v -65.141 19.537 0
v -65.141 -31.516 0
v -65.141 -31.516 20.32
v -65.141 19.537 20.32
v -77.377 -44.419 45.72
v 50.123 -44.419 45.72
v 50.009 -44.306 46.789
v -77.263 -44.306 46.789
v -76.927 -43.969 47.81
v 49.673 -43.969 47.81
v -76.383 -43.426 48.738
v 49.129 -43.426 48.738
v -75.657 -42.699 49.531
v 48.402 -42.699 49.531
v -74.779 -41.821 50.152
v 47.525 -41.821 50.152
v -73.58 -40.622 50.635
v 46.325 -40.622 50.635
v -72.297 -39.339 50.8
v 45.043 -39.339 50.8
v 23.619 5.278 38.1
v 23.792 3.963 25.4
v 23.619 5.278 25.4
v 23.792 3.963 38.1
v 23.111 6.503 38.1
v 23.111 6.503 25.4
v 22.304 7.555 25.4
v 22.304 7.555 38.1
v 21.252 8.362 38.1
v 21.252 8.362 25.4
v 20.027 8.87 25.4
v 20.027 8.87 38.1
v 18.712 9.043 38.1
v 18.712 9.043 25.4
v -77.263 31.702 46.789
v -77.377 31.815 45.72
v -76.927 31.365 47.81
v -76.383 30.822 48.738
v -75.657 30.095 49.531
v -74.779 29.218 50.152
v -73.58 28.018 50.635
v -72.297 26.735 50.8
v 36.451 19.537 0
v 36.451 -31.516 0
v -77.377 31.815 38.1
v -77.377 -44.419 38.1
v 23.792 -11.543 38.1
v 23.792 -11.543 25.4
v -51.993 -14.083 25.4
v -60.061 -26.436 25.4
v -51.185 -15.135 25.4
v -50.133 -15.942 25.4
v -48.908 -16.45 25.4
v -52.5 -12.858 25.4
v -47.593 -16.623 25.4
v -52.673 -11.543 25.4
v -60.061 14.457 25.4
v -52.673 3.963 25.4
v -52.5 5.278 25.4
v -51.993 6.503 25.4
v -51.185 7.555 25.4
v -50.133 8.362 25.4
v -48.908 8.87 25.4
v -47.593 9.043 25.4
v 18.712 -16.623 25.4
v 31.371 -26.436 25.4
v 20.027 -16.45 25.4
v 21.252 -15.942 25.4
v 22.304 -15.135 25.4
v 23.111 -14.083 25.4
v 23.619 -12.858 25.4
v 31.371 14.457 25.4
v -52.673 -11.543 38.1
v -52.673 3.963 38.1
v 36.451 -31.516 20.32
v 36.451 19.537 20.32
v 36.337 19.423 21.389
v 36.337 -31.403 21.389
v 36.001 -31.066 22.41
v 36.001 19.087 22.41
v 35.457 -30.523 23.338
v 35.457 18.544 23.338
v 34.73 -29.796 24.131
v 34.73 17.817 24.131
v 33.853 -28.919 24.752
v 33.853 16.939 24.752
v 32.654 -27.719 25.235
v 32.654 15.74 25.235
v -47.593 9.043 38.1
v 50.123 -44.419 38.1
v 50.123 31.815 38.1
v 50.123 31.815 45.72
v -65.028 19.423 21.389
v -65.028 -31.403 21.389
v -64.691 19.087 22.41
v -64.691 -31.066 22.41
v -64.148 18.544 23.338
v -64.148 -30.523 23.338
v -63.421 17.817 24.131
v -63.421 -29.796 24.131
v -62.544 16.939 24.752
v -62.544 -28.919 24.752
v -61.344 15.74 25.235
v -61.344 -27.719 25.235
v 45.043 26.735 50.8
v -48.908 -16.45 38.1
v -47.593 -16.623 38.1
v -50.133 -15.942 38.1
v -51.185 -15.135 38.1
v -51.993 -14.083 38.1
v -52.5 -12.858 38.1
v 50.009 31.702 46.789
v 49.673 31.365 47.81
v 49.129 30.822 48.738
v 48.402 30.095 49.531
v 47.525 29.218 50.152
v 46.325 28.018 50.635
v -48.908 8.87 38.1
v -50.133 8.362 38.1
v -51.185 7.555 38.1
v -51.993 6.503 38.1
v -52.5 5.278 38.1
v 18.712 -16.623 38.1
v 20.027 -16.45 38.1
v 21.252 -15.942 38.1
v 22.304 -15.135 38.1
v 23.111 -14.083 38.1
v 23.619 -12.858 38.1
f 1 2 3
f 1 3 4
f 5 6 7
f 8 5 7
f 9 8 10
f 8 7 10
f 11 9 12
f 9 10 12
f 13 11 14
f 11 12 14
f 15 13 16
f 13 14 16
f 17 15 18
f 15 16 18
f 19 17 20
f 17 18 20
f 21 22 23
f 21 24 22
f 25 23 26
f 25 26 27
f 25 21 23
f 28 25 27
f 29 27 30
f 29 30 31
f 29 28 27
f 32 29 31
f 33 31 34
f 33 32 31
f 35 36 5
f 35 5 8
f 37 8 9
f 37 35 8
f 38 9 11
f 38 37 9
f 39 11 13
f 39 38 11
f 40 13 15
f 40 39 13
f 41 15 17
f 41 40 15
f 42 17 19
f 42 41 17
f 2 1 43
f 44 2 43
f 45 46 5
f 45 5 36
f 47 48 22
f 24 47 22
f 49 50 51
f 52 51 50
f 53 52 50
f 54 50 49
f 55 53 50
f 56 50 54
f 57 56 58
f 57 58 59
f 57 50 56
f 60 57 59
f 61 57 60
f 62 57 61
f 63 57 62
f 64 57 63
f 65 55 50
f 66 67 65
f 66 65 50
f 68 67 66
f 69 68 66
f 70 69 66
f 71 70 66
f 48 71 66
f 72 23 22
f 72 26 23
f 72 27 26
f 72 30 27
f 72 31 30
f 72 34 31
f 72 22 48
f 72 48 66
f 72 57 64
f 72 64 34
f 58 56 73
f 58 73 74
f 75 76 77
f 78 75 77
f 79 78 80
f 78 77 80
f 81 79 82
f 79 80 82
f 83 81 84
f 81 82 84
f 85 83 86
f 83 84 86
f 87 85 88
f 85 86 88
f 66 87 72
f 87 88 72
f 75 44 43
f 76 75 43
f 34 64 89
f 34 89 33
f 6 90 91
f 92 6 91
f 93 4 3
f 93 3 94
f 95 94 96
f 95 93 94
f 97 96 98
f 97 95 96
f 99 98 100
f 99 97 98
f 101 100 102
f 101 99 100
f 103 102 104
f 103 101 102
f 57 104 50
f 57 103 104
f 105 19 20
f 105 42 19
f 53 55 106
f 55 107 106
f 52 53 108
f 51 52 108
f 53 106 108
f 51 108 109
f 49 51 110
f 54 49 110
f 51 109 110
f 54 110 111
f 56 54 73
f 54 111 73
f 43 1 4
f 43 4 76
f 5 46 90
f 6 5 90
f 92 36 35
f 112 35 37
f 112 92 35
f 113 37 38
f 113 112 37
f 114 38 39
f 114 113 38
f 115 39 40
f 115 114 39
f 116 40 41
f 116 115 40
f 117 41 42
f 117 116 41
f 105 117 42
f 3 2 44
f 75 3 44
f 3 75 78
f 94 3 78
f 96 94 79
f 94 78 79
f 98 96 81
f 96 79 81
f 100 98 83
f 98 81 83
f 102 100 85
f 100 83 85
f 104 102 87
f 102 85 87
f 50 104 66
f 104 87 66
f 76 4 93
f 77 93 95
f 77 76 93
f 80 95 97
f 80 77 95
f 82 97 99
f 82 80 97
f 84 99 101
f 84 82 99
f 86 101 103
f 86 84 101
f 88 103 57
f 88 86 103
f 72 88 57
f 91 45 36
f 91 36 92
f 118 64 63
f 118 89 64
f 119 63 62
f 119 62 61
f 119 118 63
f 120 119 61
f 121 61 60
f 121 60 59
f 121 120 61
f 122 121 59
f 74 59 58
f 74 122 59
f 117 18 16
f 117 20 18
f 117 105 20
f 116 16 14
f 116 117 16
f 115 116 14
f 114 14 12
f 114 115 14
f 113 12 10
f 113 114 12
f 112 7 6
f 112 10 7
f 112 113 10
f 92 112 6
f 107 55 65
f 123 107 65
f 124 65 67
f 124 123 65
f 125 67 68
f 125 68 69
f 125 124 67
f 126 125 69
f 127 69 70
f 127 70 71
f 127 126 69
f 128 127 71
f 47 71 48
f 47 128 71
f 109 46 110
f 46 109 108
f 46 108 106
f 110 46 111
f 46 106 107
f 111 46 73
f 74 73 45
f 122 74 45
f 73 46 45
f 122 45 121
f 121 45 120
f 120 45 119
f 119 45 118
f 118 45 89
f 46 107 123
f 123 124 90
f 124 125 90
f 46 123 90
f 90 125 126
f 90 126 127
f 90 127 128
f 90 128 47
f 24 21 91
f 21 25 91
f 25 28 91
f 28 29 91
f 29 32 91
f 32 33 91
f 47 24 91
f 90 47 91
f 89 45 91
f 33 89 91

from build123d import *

# Parameters (mm, degrees)
F0_W     = 101.5923656523
F0_H     = 51.0535798967
F1_DEPTH = 25.4
F2_R     = 5.08
F3_W     = 76.4648839831
F3_H     = 25.6656967103
F4_DEPTH = 12.7
F5_R     = 5.08
F6_W     = 127.4997331202
F6_H     = 76.2346722186
F7_DEPTH = 12.7
F8_R     = 5.08


with BuildPart() as f1:
    # F0 (on Top) → F1 (new body)
    with BuildSketch(Plane.XY):
        with Locations((-14.3452938646, -5.9895161539)):
            Rectangle(F0_W, F0_H)
    extrude(amount=F1_DEPTH)

    # F2
    f2_edges = [f1.edges().sort_by_distance(p)[0] for p in [
        (-14.345294, -31.516306, 25.4),
        (-65.141477, -5.989516, 25.4),
        (-14.345294, 19.537274, 25.4),
        (36.450889, -5.989516, 25.4),
    ]]
    fillet(f2_edges, radius=F2_R)

    # F3 (on face) → F4 (join)
    with BuildSketch(Plane.XY.offset(25.4)):
        with Locations((-14.4407190382, -3.7901271135)):
            Rectangle(F3_W, F3_H)
    extrude(amount=F4_DEPTH)

    # F5
    f5_edges = [f1.edges().sort_by_distance(p)[0] for p in [
        (-52.673161, -16.622975, 31.75),
        (23.791723, -16.622975, 31.75),
        (-52.673161, 9.042721, 31.75),
        (23.791723, 9.042721, 31.75),
    ]]
    fillet(f5_edges, radius=F5_R)

    # F6 (on face) → F7 (join)
    with BuildSketch(Plane.XY.offset(38.1)):
        with Locations((-13.627236709, -6.3019637018)):
            Rectangle(F6_W, F6_H)
        with BuildLine():
            Line((-47.5931610298, 9.0427212417), (18.7117229533, 9.0427212417))
            ThreePointArc((18.7117229533, 9.0427212417), (22.3038254017, 7.5548236901), (23.7917229533, 3.9627212417))
            Line((23.7917229533, 3.9627212417), (23.7917229533, -11.5429754686))
            ThreePointArc((23.7917229533, -11.5429754686), (22.3038254017, -15.1350779171), (18.7117229533, -16.6229754686))
            Line((18.7117229533, -16.6229754686), (-47.5931610298, -16.6229754686))
            ThreePointArc((-47.5931610298, -16.6229754686), (-51.1852634782, -15.1350779171), (-52.6731610298, -11.5429754686))
            Line((-52.6731610298, -11.5429754686), (-52.6731610298, 3.9627212417))
            ThreePointArc((-52.6731610298, 3.9627212417), (-51.1852634782, 7.5548236901), (-47.5931610298, 9.0427212417))
        make_face(mode=Mode.SUBTRACT)
        with BuildLine():
            ThreePointArc((23.7917229533, 3.9627212417), (22.3038254017, 7.5548236901), (18.7117229533, 9.0427212417))
            Line((18.7117229533, 9.0427212417), (-47.5931610298, 9.0427212417))
            ThreePointArc((-47.5931610298, 9.0427212417), (-51.1852634782, 7.5548236901), (-52.6731610298, 3.9627212417))
            Line((-52.6731610298, 3.9627212417), (-52.6731610298, -11.5429754686))
            ThreePointArc((-52.6731610298, -11.5429754686), (-51.1852634782, -15.1350779171), (-47.5931610298, -16.6229754686))
            Line((-47.5931610298, -16.6229754686), (18.7117229533, -16.6229754686))
            ThreePointArc((18.7117229533, -16.6229754686), (22.3038254017, -15.1350779171), (23.7917229533, -11.5429754686))
            Line((23.7917229533, -11.5429754686), (23.7917229533, 3.9627212417))
        make_face()
    extrude(amount=F7_DEPTH)

    # F8
    f8_edges = [f1.edges().sort_by_distance(p)[0] for p in [
        (-13.627237, -44.4193, 50.8),
        (-77.377103, -6.301964, 50.8),
        (-13.627237, 31.815372, 50.8),
        (50.12263, -6.301964, 50.8),
    ]]
    fillet(f8_edges, radius=F8_R)


solid = f1.part
